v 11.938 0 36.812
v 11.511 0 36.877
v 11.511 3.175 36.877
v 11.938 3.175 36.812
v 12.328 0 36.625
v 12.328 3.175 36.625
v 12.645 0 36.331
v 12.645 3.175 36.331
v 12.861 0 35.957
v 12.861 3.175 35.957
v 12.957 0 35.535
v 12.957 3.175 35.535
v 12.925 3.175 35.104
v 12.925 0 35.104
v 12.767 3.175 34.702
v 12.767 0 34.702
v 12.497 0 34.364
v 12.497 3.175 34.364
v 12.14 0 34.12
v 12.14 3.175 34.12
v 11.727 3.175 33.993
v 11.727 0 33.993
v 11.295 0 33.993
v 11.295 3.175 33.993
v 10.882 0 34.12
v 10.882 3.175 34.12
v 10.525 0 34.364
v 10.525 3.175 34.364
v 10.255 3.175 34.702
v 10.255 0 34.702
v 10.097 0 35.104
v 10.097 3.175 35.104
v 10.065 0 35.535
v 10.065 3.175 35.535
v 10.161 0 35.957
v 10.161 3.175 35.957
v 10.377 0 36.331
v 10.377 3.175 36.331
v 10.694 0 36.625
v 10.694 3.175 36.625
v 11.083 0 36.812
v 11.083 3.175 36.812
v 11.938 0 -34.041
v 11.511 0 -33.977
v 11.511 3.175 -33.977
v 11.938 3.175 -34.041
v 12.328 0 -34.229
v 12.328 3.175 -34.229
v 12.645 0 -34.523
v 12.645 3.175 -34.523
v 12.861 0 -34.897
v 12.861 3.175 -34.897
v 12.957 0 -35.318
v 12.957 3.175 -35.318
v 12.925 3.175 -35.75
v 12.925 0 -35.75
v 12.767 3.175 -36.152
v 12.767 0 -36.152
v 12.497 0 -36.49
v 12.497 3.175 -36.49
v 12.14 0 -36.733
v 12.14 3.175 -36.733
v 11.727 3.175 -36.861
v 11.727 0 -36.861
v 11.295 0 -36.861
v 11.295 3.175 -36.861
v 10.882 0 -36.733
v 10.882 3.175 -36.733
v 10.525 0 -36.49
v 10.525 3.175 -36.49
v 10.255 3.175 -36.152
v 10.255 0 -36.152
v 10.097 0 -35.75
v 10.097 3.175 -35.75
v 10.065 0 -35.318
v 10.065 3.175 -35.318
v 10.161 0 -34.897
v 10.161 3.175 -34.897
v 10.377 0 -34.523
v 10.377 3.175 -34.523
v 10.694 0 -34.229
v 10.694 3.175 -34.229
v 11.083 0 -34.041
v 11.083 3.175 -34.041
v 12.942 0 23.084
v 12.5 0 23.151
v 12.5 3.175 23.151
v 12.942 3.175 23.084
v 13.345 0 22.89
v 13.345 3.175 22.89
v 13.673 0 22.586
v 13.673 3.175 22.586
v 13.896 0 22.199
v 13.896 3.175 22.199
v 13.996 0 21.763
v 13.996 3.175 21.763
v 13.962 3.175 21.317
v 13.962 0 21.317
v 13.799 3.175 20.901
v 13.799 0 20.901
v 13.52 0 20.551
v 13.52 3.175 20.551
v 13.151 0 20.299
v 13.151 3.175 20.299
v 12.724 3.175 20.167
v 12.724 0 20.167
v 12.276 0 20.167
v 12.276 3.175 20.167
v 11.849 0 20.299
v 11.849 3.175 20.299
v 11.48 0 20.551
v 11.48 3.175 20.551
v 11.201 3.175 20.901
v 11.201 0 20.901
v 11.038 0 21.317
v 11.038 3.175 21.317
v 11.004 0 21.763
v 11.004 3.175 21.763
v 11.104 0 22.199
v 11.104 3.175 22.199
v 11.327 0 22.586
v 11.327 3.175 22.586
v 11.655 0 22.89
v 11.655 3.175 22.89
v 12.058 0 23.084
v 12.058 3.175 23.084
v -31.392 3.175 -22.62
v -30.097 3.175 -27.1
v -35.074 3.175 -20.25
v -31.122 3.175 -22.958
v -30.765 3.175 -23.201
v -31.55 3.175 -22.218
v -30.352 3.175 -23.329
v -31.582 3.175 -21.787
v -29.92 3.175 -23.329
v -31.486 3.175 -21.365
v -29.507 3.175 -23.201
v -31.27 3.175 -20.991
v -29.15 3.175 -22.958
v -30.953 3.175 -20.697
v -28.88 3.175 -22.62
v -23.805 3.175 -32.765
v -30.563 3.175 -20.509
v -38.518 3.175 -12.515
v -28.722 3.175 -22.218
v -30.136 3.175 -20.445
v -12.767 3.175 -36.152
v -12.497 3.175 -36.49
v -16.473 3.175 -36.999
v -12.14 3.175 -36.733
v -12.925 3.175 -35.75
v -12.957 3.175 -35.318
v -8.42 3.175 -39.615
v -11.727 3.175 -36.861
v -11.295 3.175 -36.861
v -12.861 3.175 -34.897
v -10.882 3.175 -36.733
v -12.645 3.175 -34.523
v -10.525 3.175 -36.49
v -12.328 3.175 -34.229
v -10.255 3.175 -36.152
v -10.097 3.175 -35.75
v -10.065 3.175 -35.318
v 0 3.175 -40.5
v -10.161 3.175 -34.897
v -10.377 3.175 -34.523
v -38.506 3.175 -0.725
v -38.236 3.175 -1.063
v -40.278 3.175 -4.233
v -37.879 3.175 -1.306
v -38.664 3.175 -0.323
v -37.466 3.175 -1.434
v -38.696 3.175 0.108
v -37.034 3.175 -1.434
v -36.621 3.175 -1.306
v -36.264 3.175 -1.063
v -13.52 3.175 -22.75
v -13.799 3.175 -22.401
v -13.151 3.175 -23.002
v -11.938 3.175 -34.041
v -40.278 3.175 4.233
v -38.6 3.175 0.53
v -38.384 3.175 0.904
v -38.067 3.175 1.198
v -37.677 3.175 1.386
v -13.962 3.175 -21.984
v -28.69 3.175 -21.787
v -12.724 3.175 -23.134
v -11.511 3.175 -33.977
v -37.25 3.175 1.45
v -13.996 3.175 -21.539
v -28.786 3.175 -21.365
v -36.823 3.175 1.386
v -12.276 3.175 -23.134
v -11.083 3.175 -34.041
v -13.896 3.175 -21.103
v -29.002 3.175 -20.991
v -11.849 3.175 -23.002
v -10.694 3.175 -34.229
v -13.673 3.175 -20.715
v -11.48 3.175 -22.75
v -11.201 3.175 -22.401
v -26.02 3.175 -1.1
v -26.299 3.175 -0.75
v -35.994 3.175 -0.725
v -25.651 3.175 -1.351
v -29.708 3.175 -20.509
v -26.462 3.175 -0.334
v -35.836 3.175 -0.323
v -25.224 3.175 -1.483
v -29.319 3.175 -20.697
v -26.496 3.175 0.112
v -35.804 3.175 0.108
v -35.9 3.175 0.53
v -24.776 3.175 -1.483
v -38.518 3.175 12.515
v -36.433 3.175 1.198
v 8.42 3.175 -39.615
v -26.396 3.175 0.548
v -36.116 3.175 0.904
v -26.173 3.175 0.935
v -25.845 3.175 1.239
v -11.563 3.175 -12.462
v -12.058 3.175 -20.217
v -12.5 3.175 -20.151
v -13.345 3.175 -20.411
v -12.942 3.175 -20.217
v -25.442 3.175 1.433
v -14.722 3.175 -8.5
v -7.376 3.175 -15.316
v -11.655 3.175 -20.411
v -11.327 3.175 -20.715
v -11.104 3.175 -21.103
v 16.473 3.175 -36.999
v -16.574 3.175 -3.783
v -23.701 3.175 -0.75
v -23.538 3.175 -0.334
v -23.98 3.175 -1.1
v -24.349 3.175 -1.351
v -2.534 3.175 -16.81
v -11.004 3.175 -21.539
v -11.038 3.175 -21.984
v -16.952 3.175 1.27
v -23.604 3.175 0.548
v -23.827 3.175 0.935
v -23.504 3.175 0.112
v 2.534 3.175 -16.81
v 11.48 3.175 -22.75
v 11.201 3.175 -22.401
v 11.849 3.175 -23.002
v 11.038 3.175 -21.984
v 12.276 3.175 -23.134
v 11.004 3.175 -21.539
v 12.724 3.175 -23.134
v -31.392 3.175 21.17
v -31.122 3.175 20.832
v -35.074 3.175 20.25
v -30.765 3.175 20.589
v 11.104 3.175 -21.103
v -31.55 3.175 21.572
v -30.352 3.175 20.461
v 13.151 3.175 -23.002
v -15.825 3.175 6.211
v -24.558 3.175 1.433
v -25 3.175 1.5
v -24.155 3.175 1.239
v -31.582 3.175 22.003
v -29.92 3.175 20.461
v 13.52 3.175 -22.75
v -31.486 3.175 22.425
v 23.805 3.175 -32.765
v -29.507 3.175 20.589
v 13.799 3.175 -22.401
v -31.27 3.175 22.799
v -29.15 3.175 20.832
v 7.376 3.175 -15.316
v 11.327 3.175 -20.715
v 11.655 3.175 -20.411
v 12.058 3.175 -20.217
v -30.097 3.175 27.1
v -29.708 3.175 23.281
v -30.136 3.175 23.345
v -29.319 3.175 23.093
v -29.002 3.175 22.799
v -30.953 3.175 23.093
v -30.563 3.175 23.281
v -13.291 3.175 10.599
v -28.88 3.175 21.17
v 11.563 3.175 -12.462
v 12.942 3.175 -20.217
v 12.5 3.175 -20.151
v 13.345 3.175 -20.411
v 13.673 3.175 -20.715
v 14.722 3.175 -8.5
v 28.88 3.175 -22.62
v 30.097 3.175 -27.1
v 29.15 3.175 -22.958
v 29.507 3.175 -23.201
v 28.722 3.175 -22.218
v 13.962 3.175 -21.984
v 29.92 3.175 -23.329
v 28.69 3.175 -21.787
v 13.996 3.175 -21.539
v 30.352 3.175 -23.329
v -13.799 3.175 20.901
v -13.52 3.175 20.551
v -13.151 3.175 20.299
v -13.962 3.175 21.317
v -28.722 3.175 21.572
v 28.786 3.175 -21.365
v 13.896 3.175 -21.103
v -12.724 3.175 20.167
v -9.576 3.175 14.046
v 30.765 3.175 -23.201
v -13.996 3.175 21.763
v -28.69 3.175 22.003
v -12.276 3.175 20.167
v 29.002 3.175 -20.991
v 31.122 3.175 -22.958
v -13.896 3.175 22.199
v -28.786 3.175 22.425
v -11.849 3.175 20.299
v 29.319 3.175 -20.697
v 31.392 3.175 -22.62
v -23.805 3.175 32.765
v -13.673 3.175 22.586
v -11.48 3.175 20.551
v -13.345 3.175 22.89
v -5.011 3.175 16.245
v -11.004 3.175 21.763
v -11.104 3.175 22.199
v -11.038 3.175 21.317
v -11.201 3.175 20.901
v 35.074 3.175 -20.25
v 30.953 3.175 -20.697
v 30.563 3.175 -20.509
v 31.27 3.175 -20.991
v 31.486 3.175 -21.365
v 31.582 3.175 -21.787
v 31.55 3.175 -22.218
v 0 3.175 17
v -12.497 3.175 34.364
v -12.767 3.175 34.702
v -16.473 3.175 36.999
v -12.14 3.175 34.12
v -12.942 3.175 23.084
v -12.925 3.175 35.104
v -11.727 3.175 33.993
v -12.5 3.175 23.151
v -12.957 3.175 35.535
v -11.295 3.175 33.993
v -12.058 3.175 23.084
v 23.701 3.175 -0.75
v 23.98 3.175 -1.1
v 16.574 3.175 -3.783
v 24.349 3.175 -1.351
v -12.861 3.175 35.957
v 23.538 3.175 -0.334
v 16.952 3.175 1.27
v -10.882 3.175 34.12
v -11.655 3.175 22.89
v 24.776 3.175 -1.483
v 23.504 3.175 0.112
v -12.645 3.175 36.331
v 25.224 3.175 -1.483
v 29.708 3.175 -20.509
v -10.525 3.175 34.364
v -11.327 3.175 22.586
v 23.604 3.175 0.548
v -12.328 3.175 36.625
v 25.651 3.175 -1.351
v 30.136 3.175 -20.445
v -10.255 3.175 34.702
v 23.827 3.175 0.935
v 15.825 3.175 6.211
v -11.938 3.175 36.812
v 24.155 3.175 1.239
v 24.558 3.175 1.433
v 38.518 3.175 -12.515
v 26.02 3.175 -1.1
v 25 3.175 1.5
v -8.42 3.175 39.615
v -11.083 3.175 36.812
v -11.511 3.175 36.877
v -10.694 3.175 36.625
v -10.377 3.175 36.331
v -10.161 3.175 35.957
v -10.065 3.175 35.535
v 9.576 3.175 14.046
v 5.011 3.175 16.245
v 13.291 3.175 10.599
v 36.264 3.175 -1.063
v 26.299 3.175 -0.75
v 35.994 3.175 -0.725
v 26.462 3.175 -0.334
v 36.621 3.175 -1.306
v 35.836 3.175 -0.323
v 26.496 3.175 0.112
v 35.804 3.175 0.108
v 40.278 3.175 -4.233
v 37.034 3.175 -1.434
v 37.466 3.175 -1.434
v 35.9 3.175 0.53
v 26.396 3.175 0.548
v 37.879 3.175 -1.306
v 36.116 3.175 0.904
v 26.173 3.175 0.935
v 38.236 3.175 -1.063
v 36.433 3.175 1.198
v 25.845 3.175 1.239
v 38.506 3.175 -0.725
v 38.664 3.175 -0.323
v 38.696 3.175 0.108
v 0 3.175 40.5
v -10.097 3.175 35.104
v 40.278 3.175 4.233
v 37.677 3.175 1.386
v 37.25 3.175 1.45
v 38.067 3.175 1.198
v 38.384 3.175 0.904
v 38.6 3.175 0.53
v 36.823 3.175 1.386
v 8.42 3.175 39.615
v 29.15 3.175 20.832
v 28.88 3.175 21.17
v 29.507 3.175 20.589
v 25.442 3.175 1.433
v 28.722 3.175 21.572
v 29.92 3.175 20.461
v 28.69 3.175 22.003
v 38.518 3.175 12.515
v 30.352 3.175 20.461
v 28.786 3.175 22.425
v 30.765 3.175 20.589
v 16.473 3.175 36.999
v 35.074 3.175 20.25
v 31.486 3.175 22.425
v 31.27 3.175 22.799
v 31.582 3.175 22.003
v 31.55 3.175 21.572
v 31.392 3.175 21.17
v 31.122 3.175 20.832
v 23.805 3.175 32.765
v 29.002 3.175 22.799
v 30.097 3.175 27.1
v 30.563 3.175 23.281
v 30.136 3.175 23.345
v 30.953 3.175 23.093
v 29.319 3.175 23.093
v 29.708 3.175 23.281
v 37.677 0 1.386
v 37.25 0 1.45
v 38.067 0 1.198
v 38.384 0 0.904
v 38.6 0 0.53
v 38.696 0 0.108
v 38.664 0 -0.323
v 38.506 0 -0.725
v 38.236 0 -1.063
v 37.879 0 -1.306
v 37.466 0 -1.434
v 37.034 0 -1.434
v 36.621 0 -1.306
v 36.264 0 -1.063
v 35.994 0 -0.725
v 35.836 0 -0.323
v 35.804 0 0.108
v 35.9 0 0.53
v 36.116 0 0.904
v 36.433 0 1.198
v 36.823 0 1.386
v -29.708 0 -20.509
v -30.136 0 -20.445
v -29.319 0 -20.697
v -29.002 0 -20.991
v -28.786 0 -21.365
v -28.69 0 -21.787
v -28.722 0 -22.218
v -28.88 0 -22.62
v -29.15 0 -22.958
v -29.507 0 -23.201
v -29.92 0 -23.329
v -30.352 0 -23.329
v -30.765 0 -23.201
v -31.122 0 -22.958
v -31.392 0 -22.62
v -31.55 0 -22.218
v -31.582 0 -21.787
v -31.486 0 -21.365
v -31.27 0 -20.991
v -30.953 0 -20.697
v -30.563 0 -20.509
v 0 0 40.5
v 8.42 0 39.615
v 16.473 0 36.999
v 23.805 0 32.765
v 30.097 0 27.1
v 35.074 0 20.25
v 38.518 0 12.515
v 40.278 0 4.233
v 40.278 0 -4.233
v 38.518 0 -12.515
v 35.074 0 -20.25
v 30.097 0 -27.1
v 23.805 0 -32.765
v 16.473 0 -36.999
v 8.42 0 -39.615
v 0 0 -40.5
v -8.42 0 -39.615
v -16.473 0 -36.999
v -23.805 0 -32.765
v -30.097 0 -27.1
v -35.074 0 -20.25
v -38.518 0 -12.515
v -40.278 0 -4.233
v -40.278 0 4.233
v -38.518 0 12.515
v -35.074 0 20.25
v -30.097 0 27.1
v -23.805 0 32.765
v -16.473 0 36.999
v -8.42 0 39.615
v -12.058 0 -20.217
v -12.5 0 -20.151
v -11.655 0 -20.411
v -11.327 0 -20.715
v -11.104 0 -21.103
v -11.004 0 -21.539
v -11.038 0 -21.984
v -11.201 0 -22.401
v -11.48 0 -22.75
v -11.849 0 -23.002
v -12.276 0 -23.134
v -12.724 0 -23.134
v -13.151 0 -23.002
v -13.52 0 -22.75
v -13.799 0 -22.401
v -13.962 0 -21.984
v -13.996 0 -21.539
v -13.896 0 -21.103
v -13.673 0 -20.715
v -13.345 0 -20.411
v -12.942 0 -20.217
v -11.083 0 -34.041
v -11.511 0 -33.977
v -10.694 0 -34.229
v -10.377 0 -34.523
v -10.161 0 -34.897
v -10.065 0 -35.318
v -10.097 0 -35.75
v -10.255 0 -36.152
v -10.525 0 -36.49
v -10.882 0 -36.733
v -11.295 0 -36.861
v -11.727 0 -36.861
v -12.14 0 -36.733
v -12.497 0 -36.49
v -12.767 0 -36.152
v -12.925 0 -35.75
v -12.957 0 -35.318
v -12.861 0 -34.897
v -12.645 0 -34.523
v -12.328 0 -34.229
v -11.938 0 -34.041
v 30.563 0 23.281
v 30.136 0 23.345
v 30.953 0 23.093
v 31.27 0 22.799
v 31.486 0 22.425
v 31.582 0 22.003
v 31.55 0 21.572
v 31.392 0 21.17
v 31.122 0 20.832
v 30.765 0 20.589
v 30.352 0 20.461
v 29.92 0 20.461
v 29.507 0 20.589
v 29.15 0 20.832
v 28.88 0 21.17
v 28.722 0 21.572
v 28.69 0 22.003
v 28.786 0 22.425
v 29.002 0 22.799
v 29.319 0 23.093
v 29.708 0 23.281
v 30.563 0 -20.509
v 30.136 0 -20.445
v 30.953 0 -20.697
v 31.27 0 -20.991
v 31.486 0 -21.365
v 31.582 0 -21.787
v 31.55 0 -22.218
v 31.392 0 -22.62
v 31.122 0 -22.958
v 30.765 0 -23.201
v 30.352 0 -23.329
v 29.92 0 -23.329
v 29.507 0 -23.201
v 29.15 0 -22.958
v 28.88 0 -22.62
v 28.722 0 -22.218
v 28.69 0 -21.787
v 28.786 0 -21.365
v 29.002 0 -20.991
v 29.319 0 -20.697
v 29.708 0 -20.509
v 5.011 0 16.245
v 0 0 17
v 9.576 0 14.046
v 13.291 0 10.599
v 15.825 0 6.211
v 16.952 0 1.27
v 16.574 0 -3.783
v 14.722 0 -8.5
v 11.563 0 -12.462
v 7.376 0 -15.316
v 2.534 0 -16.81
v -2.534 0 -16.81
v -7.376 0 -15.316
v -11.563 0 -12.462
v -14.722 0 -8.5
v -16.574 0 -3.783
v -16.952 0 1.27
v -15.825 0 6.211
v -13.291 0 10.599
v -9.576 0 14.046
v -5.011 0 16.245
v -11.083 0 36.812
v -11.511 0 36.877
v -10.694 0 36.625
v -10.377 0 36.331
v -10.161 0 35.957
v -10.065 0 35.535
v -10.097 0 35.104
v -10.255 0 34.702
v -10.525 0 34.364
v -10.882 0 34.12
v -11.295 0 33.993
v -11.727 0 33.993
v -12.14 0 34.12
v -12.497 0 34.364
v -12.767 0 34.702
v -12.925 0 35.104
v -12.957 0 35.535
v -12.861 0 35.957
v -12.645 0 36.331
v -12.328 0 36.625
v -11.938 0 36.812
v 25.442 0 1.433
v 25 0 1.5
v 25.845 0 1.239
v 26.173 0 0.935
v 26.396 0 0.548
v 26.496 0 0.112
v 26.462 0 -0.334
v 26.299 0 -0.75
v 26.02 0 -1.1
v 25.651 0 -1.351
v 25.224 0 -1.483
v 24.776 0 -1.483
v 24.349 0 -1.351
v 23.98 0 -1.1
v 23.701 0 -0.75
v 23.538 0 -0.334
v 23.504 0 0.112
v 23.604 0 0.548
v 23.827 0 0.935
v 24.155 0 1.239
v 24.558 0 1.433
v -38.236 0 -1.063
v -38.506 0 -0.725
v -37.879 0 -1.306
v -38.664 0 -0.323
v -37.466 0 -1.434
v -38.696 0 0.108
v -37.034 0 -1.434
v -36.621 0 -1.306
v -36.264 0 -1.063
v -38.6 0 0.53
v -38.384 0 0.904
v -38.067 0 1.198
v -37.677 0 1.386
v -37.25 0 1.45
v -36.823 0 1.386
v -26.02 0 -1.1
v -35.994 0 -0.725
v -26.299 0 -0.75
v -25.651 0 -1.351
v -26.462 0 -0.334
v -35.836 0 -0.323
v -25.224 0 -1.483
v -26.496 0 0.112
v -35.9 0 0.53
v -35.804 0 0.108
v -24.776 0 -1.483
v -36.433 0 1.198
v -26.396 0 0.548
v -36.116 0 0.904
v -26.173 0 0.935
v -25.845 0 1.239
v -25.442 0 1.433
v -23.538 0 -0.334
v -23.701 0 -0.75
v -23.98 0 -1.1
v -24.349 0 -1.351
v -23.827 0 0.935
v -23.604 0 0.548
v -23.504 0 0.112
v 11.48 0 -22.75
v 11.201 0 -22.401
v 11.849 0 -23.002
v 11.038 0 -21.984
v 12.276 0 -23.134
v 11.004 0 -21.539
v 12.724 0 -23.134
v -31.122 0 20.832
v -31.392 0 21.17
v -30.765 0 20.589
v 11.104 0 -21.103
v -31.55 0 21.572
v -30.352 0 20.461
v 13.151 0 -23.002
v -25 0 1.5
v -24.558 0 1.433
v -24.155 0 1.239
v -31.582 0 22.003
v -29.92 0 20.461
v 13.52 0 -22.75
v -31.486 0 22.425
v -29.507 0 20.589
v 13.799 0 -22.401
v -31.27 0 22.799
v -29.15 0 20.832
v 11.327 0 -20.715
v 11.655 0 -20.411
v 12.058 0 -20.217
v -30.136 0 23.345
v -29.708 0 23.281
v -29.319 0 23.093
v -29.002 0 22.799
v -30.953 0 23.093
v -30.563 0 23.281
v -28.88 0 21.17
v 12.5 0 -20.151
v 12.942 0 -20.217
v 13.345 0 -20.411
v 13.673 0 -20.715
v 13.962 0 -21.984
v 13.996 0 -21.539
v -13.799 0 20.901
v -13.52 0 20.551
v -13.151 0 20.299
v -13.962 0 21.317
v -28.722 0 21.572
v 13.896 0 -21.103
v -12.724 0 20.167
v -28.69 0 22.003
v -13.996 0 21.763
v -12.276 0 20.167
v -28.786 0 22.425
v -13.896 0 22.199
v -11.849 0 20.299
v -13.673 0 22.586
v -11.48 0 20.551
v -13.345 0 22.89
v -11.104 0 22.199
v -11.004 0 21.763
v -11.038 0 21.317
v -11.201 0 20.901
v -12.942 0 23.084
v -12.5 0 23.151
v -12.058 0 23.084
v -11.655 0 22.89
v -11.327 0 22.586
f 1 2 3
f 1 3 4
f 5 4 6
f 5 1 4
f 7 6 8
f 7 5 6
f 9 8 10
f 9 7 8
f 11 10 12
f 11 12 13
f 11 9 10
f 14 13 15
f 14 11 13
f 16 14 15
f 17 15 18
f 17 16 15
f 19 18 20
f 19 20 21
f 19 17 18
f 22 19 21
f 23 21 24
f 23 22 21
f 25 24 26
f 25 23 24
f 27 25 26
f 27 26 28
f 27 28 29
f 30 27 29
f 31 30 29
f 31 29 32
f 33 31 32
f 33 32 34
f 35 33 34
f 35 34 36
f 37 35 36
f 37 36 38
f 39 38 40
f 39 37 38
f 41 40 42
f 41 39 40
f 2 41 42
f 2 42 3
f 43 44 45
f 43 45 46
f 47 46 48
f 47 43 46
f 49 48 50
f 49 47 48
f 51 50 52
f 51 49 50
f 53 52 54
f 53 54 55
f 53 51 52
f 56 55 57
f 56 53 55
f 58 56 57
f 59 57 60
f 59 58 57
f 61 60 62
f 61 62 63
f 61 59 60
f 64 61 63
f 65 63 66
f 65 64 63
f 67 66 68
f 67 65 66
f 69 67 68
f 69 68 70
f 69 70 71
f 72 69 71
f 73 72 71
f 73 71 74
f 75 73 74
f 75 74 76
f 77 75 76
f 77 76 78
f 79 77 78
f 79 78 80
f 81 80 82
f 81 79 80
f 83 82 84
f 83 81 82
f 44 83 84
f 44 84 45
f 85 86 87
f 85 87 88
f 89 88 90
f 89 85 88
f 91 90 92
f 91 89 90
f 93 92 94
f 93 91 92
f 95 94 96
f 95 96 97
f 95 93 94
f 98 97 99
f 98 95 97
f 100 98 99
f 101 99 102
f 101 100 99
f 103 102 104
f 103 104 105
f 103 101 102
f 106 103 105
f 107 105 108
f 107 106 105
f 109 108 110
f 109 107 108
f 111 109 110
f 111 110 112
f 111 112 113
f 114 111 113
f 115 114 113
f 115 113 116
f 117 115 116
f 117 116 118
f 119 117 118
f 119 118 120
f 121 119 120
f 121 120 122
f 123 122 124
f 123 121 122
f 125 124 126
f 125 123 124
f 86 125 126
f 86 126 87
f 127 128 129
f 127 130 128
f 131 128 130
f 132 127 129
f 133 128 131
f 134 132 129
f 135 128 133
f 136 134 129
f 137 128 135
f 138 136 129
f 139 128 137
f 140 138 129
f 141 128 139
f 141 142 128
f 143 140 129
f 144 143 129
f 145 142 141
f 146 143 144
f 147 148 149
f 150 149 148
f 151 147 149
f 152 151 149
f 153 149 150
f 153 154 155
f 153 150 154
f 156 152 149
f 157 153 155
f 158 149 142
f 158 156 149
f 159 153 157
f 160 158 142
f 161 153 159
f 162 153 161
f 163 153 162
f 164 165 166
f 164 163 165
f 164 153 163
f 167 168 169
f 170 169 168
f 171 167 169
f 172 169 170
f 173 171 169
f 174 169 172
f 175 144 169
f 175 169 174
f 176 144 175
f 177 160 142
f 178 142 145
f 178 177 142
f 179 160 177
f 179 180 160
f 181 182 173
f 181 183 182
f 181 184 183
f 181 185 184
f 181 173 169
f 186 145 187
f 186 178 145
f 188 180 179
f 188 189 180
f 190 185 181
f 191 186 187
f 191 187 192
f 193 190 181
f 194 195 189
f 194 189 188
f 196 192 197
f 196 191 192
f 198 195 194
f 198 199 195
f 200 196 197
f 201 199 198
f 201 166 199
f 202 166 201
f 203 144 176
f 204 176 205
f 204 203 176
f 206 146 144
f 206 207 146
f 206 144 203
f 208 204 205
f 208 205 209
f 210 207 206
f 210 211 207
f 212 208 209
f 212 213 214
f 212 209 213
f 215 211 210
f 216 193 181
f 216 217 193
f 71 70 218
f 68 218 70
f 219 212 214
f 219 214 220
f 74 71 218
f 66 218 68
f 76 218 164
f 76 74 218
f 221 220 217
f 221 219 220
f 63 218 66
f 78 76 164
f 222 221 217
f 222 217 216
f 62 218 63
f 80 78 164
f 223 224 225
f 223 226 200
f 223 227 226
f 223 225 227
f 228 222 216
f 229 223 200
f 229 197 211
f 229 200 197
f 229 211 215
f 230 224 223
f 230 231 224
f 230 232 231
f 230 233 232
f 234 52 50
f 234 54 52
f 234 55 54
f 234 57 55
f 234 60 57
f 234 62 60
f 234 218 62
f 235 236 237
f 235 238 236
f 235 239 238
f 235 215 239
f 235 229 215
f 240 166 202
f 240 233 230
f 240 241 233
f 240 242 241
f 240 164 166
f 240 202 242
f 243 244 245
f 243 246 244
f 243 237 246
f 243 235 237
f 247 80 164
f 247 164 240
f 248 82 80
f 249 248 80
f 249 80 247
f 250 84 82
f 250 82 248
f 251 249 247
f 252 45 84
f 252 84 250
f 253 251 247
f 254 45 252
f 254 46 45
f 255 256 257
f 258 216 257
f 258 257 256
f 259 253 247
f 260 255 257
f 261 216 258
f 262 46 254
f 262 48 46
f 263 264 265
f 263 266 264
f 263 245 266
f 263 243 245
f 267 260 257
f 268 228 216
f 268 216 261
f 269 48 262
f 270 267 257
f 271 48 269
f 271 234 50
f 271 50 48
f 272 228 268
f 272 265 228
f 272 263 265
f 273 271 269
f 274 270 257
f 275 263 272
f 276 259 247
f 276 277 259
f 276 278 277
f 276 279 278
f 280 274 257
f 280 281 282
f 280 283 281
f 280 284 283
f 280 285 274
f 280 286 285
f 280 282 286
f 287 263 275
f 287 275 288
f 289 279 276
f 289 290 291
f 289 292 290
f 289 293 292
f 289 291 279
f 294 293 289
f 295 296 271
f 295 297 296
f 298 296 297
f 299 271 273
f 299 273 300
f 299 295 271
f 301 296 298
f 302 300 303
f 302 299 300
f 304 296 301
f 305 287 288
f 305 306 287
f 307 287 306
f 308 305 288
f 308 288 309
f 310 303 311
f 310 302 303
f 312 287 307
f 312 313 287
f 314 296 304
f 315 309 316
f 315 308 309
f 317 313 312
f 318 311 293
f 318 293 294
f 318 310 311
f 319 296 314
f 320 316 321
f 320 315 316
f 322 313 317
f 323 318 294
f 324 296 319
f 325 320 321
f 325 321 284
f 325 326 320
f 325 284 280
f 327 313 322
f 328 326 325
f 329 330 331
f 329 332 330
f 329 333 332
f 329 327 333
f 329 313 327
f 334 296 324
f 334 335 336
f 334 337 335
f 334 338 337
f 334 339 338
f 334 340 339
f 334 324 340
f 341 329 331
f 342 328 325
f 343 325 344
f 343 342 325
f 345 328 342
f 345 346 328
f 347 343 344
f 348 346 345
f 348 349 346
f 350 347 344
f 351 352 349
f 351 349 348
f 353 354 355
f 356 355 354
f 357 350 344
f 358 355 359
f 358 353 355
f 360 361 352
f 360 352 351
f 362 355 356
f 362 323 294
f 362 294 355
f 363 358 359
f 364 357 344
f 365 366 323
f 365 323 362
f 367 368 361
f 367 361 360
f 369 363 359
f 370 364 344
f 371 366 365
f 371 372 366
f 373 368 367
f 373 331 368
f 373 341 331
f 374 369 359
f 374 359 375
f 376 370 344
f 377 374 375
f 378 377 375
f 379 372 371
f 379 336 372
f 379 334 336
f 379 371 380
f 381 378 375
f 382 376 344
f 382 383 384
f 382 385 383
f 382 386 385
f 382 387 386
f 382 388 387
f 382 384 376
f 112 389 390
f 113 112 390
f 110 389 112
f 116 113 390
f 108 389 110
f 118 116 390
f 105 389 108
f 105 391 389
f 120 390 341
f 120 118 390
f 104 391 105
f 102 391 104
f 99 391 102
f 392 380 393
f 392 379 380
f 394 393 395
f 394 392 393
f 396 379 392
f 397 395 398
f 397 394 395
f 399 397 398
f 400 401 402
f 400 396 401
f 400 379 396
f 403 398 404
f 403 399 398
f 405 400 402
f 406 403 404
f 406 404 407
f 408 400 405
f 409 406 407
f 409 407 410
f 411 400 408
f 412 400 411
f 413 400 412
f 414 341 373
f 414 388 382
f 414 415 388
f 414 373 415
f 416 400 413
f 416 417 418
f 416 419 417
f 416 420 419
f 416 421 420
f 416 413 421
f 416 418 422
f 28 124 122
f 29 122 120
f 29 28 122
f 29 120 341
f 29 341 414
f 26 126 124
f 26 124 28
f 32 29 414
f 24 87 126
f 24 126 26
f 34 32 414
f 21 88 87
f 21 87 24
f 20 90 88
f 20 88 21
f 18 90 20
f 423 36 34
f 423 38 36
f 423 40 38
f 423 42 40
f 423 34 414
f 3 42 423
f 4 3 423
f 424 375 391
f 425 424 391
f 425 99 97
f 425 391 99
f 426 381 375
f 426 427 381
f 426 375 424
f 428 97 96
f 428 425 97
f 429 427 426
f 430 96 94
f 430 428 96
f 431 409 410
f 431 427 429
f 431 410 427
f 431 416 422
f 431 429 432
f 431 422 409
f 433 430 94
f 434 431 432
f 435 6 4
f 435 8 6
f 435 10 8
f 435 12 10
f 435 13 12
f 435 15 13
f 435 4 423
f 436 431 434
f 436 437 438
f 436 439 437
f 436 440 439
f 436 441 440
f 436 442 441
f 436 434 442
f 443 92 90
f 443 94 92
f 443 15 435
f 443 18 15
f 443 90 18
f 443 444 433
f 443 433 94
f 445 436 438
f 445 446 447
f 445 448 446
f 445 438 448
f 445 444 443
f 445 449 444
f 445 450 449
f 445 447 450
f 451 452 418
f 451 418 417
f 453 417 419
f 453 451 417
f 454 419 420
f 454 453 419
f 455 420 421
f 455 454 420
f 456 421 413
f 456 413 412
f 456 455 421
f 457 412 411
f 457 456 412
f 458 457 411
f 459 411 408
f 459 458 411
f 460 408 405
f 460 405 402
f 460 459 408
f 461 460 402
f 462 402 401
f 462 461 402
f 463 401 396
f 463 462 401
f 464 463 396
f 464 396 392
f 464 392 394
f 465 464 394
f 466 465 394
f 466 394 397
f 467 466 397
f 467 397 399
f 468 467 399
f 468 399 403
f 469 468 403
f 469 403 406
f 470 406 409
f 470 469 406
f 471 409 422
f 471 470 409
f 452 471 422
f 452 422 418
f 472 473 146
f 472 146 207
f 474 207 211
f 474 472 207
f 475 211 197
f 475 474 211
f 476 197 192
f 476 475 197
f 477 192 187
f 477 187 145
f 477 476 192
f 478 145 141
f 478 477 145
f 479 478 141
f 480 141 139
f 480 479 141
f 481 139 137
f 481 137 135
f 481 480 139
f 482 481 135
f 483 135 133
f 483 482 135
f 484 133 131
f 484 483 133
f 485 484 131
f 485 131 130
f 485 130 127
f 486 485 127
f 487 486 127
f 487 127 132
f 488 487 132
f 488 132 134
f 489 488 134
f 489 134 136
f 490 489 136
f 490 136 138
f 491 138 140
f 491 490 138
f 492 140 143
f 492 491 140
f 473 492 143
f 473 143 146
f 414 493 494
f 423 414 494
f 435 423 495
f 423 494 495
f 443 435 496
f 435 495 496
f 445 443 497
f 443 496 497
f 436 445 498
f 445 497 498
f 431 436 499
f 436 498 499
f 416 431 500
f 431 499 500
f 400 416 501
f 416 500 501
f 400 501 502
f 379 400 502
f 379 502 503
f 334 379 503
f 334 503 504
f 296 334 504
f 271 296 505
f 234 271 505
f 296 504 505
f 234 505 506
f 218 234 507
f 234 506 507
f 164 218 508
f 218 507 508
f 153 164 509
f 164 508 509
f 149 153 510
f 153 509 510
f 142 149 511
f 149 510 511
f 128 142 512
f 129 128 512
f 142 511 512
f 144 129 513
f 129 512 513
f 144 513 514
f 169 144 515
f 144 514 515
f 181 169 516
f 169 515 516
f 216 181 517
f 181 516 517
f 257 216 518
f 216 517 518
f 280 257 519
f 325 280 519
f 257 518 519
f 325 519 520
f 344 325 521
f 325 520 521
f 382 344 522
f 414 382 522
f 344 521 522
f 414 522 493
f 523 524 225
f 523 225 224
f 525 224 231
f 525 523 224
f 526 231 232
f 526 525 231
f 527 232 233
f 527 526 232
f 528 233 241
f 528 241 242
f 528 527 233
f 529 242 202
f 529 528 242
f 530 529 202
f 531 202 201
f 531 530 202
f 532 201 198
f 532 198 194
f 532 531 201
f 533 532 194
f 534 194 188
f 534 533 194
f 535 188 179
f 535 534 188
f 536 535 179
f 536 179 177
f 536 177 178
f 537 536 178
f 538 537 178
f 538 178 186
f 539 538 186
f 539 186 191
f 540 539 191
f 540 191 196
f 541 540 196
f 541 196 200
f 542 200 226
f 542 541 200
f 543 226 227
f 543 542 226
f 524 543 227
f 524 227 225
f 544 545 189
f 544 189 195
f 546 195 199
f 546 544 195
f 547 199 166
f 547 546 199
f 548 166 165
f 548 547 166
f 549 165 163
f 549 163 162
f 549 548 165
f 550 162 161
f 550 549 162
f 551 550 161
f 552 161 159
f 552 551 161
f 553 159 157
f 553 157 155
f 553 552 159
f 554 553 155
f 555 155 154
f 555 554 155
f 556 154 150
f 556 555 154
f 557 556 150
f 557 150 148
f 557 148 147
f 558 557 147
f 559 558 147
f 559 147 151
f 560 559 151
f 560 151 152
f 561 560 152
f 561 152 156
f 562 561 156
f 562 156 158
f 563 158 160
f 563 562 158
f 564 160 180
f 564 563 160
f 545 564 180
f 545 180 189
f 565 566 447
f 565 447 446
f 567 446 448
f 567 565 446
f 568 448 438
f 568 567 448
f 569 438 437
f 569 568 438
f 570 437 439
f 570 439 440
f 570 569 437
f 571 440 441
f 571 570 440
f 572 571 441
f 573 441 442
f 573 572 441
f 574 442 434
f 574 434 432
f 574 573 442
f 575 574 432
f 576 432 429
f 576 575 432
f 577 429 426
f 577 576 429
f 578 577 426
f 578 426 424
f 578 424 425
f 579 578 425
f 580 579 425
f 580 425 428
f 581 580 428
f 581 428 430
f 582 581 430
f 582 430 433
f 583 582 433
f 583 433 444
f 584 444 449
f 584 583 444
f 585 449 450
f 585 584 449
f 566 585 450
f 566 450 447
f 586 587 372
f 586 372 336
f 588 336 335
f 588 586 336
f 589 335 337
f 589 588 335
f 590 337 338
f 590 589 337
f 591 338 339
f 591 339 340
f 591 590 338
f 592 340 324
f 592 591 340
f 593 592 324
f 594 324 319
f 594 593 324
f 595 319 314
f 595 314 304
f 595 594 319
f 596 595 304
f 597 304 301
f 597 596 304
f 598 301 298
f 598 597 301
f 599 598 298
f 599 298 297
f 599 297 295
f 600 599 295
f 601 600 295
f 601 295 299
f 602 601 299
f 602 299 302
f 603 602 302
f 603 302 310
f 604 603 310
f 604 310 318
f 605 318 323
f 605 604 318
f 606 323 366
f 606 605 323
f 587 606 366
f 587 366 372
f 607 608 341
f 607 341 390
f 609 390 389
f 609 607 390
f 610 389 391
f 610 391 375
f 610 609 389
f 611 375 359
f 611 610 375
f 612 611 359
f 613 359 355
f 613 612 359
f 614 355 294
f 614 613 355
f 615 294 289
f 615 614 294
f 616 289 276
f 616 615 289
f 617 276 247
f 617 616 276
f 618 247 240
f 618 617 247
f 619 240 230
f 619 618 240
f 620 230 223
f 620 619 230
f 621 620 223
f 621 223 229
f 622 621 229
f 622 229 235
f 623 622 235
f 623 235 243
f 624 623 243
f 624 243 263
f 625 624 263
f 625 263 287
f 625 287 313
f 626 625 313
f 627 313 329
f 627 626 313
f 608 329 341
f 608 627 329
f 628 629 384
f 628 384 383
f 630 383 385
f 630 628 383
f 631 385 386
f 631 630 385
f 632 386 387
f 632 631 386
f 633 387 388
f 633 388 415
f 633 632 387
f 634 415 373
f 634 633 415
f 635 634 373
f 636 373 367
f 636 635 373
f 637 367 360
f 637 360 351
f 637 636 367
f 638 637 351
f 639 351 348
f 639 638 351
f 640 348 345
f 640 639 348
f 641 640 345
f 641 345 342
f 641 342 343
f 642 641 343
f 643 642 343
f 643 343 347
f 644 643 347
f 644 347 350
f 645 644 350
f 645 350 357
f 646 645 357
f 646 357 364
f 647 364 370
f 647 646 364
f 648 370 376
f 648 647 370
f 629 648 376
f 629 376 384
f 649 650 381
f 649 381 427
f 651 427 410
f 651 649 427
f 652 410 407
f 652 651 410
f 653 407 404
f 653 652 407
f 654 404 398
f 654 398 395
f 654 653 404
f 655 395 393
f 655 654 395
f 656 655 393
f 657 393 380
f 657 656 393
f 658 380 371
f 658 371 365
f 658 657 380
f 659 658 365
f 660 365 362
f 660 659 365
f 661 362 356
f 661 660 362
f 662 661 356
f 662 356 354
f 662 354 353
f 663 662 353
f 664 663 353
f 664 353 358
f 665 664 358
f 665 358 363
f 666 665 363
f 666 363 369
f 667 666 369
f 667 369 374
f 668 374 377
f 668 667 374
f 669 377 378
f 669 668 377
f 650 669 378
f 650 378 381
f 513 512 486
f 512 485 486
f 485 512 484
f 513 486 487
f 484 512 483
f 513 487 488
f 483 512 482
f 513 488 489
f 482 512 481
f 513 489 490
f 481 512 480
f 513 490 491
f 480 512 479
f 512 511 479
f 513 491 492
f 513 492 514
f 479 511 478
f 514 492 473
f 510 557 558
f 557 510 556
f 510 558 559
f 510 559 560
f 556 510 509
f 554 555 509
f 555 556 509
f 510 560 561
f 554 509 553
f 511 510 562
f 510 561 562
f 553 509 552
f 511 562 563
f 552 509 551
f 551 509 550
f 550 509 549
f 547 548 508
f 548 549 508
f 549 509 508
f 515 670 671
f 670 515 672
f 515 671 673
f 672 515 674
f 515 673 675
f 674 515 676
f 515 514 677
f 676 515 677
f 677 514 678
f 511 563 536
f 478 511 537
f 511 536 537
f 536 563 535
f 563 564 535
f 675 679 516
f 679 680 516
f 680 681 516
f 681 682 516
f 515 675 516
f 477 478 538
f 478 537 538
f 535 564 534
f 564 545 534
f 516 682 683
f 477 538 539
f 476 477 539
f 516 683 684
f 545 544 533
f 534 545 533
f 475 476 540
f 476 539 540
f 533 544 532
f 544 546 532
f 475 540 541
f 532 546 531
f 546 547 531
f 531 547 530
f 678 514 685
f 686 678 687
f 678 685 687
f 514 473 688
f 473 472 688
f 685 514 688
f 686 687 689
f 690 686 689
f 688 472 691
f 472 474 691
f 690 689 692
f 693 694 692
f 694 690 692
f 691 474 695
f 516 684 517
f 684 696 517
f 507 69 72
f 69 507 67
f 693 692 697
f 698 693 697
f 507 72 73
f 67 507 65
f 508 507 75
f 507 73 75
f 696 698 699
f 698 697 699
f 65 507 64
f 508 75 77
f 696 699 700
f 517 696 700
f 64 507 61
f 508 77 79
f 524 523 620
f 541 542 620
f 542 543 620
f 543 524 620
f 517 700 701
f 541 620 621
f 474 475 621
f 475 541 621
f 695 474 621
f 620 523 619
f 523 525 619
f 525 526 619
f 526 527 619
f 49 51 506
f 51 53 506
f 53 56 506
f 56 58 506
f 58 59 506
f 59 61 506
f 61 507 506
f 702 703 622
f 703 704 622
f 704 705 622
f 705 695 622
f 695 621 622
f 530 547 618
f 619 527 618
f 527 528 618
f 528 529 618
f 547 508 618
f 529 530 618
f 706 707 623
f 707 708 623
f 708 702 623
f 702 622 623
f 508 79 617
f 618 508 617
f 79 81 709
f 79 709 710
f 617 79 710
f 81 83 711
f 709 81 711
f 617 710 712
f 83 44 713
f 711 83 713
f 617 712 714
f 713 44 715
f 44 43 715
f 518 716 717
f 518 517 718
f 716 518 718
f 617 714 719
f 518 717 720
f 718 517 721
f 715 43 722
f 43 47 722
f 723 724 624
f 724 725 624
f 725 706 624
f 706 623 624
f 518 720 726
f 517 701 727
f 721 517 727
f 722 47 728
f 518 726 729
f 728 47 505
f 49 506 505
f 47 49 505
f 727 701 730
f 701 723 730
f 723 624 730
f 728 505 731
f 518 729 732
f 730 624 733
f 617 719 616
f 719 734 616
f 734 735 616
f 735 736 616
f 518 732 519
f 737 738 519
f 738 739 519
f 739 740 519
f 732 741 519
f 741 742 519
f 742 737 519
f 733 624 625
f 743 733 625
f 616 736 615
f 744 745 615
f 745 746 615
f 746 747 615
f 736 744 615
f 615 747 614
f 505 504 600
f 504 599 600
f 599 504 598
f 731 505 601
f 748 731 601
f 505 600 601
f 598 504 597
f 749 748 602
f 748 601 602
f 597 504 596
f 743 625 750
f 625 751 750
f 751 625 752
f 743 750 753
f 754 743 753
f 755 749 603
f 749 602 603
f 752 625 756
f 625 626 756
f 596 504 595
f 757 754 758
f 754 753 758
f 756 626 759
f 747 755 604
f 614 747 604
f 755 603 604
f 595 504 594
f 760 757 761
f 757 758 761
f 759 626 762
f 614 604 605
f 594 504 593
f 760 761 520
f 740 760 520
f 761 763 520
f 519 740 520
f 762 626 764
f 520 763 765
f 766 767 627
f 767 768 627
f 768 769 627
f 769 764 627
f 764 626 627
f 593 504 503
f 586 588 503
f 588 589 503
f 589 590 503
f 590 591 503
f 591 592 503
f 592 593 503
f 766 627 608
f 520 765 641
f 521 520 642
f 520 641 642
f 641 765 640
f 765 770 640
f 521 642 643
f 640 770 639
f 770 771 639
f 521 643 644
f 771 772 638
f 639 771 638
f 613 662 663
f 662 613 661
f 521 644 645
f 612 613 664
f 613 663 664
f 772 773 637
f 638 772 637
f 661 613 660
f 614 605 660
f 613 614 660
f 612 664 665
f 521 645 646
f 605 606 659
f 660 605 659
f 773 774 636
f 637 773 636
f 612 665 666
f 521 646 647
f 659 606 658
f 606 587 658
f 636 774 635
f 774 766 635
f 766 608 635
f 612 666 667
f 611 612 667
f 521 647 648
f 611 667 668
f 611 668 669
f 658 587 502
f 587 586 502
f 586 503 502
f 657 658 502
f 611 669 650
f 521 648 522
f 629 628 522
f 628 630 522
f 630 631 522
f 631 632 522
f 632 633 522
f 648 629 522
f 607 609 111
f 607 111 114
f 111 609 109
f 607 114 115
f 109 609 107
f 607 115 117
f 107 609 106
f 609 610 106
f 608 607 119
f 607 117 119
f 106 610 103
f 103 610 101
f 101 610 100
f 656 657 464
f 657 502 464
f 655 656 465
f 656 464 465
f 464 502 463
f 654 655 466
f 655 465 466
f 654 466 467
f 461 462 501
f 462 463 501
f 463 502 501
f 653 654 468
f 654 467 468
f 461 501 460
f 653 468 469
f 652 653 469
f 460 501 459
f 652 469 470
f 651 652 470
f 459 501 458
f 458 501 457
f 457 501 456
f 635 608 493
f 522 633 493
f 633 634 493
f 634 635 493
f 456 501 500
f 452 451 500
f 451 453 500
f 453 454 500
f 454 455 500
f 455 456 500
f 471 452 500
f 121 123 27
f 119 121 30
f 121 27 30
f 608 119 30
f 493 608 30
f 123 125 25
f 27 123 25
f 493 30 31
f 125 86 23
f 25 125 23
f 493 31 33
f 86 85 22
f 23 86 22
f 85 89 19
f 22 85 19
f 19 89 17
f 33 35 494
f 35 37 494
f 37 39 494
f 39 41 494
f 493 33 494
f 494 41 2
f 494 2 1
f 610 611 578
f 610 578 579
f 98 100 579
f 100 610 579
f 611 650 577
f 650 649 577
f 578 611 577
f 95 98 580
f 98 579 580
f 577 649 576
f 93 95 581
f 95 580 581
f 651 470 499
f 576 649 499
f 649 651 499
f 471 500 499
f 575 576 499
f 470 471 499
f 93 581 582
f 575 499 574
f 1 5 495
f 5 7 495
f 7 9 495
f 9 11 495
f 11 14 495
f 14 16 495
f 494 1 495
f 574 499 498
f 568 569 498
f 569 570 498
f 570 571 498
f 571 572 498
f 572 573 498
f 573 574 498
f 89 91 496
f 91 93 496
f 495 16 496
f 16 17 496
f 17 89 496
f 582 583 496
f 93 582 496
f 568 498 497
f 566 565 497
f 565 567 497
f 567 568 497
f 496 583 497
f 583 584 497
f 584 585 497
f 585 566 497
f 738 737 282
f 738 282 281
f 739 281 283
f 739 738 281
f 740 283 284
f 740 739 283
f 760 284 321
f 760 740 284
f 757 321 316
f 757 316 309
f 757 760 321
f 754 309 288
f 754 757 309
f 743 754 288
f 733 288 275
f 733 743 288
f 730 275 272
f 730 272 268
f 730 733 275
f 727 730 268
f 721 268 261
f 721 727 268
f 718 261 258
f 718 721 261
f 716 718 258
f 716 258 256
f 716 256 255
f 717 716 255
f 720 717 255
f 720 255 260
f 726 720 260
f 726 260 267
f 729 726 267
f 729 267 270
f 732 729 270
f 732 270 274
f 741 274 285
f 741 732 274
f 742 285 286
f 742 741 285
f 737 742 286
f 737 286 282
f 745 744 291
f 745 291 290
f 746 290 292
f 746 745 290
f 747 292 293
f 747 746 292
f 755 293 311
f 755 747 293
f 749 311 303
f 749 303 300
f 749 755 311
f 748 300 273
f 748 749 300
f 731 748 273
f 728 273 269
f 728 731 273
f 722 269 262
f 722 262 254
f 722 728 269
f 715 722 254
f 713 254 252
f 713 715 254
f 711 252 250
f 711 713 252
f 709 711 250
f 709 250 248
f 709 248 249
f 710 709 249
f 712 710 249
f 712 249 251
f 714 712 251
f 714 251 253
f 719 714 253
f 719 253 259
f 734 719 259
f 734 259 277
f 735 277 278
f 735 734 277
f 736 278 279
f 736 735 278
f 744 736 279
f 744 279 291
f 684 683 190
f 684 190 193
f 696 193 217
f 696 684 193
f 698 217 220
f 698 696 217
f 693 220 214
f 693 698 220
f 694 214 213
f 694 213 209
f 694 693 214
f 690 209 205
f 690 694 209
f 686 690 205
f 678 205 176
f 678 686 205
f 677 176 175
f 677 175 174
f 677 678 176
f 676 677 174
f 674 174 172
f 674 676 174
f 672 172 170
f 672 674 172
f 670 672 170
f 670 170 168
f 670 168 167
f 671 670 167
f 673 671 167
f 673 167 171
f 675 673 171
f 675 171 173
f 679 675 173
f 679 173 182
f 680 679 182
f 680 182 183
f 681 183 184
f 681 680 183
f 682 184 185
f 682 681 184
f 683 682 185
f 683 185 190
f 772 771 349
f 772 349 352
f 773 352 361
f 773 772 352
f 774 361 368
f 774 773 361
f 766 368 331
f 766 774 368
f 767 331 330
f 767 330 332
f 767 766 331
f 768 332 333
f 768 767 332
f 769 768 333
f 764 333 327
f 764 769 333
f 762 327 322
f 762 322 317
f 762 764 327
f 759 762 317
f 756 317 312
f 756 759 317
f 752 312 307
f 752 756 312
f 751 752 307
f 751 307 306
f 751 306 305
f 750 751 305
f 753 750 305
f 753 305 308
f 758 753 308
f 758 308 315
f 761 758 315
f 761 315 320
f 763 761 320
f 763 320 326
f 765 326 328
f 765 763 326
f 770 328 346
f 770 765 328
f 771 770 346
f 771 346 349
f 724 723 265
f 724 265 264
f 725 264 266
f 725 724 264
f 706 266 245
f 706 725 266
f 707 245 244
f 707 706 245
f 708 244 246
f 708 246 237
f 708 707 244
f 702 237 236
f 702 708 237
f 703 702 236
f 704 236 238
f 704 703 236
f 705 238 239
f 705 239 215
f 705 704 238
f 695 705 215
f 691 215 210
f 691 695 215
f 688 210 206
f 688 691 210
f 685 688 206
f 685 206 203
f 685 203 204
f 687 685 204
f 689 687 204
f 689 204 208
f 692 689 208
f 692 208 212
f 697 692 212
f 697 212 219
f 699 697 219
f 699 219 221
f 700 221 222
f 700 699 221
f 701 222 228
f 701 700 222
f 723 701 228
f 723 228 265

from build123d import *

# Parameters (mm, degrees)
SKETCH2_R           = 40.5
SKETCH2_R_2         = 17
SKETCH2_R_3         = 1.45
SKETCH2_R_4         = 1.5
BOSS_EXTRUDE1_DEPTH = 3.175


with BuildPart() as part:
    # Sketch2 → Boss-Extrude1 (new body)
    with BuildSketch(Plane(origin=(0, 0, 0), x_dir=(1, 0, 0), z_dir=(0, 1, 0))):
        with Locations(Location((0, 0, 0), (0, 0, 270))):
            Circle(SKETCH2_R)
        with Locations(Location((0, 0, 0), (0, 0, 270))):
            Circle(SKETCH2_R_2, mode=Mode.SUBTRACT)
        with Locations(Location((-37.25, 0, 0), (0, 0, 270))):
            Circle(SKETCH2_R_3, mode=Mode.SUBTRACT)
        with Locations(Location((-25, 0, 0), (0, 0, 270))):
            Circle(SKETCH2_R_4, mode=Mode.SUBTRACT)
        with Locations(Location((-12.5, 21.650635095, 0), (0, 0, 270))):
            Circle(SKETCH2_R_4, mode=Mode.SUBTRACT)
        with Locations(Location((12.5, 21.650635095, 0), (0, 0, 270))):
            Circle(SKETCH2_R_4, mode=Mode.SUBTRACT)
        with Locations(Location((25, 0, 0), (0, 0, 270))):
            Circle(SKETCH2_R_4, mode=Mode.SUBTRACT)
        with Locations(Location((12.5, -21.650635095, 0), (0, 0, 270))):
            Circle(SKETCH2_R_4, mode=Mode.SUBTRACT)
        with Locations(Location((-12.5, -21.650635095, 0), (0, 0, 270))):
            Circle(SKETCH2_R_4, mode=Mode.SUBTRACT)
        with Locations(Location((-30.13588304, 21.895000648, 0), (0, 0, 270))):
            Circle(SKETCH2_R_3, mode=Mode.SUBTRACT)
        with Locations(Location((-11.51088304, 35.426855232, 0), (0, 0, 270))):
            Circle(SKETCH2_R_3, mode=Mode.SUBTRACT)
        with Locations(Location((11.51088304, 35.426855232, 0), (0, 0, 270))):
            Circle(SKETCH2_R_3, mode=Mode.SUBTRACT)
        with Locations(Location((30.13588304, 21.895000648, 0), (0, 0, 270))):
            Circle(SKETCH2_R_3, mode=Mode.SUBTRACT)
        with Locations(Location((37.25, 0, 0), (0, 0, 270))):
            Circle(SKETCH2_R_3, mode=Mode.SUBTRACT)
        with Locations(Location((30.13588304, -21.895000648, 0), (0, 0, 270))):
            Circle(SKETCH2_R_3, mode=Mode.SUBTRACT)
        with Locations(Location((11.51088304, -35.426855232, 0), (0, 0, 270))):
            Circle(SKETCH2_R_3, mode=Mode.SUBTRACT)
        with Locations(Location((-11.51088304, -35.426855232, 0), (0, 0, 270))):
            Circle(SKETCH2_R_3, mode=Mode.SUBTRACT)
        with Locations(Location((-30.13588304, -21.895000648, 0), (0, 0, 270))):
            Circle(SKETCH2_R_3, mode=Mode.SUBTRACT)
    extrude(amount=BOSS_EXTRUDE1_DEPTH)


solid = part.part
